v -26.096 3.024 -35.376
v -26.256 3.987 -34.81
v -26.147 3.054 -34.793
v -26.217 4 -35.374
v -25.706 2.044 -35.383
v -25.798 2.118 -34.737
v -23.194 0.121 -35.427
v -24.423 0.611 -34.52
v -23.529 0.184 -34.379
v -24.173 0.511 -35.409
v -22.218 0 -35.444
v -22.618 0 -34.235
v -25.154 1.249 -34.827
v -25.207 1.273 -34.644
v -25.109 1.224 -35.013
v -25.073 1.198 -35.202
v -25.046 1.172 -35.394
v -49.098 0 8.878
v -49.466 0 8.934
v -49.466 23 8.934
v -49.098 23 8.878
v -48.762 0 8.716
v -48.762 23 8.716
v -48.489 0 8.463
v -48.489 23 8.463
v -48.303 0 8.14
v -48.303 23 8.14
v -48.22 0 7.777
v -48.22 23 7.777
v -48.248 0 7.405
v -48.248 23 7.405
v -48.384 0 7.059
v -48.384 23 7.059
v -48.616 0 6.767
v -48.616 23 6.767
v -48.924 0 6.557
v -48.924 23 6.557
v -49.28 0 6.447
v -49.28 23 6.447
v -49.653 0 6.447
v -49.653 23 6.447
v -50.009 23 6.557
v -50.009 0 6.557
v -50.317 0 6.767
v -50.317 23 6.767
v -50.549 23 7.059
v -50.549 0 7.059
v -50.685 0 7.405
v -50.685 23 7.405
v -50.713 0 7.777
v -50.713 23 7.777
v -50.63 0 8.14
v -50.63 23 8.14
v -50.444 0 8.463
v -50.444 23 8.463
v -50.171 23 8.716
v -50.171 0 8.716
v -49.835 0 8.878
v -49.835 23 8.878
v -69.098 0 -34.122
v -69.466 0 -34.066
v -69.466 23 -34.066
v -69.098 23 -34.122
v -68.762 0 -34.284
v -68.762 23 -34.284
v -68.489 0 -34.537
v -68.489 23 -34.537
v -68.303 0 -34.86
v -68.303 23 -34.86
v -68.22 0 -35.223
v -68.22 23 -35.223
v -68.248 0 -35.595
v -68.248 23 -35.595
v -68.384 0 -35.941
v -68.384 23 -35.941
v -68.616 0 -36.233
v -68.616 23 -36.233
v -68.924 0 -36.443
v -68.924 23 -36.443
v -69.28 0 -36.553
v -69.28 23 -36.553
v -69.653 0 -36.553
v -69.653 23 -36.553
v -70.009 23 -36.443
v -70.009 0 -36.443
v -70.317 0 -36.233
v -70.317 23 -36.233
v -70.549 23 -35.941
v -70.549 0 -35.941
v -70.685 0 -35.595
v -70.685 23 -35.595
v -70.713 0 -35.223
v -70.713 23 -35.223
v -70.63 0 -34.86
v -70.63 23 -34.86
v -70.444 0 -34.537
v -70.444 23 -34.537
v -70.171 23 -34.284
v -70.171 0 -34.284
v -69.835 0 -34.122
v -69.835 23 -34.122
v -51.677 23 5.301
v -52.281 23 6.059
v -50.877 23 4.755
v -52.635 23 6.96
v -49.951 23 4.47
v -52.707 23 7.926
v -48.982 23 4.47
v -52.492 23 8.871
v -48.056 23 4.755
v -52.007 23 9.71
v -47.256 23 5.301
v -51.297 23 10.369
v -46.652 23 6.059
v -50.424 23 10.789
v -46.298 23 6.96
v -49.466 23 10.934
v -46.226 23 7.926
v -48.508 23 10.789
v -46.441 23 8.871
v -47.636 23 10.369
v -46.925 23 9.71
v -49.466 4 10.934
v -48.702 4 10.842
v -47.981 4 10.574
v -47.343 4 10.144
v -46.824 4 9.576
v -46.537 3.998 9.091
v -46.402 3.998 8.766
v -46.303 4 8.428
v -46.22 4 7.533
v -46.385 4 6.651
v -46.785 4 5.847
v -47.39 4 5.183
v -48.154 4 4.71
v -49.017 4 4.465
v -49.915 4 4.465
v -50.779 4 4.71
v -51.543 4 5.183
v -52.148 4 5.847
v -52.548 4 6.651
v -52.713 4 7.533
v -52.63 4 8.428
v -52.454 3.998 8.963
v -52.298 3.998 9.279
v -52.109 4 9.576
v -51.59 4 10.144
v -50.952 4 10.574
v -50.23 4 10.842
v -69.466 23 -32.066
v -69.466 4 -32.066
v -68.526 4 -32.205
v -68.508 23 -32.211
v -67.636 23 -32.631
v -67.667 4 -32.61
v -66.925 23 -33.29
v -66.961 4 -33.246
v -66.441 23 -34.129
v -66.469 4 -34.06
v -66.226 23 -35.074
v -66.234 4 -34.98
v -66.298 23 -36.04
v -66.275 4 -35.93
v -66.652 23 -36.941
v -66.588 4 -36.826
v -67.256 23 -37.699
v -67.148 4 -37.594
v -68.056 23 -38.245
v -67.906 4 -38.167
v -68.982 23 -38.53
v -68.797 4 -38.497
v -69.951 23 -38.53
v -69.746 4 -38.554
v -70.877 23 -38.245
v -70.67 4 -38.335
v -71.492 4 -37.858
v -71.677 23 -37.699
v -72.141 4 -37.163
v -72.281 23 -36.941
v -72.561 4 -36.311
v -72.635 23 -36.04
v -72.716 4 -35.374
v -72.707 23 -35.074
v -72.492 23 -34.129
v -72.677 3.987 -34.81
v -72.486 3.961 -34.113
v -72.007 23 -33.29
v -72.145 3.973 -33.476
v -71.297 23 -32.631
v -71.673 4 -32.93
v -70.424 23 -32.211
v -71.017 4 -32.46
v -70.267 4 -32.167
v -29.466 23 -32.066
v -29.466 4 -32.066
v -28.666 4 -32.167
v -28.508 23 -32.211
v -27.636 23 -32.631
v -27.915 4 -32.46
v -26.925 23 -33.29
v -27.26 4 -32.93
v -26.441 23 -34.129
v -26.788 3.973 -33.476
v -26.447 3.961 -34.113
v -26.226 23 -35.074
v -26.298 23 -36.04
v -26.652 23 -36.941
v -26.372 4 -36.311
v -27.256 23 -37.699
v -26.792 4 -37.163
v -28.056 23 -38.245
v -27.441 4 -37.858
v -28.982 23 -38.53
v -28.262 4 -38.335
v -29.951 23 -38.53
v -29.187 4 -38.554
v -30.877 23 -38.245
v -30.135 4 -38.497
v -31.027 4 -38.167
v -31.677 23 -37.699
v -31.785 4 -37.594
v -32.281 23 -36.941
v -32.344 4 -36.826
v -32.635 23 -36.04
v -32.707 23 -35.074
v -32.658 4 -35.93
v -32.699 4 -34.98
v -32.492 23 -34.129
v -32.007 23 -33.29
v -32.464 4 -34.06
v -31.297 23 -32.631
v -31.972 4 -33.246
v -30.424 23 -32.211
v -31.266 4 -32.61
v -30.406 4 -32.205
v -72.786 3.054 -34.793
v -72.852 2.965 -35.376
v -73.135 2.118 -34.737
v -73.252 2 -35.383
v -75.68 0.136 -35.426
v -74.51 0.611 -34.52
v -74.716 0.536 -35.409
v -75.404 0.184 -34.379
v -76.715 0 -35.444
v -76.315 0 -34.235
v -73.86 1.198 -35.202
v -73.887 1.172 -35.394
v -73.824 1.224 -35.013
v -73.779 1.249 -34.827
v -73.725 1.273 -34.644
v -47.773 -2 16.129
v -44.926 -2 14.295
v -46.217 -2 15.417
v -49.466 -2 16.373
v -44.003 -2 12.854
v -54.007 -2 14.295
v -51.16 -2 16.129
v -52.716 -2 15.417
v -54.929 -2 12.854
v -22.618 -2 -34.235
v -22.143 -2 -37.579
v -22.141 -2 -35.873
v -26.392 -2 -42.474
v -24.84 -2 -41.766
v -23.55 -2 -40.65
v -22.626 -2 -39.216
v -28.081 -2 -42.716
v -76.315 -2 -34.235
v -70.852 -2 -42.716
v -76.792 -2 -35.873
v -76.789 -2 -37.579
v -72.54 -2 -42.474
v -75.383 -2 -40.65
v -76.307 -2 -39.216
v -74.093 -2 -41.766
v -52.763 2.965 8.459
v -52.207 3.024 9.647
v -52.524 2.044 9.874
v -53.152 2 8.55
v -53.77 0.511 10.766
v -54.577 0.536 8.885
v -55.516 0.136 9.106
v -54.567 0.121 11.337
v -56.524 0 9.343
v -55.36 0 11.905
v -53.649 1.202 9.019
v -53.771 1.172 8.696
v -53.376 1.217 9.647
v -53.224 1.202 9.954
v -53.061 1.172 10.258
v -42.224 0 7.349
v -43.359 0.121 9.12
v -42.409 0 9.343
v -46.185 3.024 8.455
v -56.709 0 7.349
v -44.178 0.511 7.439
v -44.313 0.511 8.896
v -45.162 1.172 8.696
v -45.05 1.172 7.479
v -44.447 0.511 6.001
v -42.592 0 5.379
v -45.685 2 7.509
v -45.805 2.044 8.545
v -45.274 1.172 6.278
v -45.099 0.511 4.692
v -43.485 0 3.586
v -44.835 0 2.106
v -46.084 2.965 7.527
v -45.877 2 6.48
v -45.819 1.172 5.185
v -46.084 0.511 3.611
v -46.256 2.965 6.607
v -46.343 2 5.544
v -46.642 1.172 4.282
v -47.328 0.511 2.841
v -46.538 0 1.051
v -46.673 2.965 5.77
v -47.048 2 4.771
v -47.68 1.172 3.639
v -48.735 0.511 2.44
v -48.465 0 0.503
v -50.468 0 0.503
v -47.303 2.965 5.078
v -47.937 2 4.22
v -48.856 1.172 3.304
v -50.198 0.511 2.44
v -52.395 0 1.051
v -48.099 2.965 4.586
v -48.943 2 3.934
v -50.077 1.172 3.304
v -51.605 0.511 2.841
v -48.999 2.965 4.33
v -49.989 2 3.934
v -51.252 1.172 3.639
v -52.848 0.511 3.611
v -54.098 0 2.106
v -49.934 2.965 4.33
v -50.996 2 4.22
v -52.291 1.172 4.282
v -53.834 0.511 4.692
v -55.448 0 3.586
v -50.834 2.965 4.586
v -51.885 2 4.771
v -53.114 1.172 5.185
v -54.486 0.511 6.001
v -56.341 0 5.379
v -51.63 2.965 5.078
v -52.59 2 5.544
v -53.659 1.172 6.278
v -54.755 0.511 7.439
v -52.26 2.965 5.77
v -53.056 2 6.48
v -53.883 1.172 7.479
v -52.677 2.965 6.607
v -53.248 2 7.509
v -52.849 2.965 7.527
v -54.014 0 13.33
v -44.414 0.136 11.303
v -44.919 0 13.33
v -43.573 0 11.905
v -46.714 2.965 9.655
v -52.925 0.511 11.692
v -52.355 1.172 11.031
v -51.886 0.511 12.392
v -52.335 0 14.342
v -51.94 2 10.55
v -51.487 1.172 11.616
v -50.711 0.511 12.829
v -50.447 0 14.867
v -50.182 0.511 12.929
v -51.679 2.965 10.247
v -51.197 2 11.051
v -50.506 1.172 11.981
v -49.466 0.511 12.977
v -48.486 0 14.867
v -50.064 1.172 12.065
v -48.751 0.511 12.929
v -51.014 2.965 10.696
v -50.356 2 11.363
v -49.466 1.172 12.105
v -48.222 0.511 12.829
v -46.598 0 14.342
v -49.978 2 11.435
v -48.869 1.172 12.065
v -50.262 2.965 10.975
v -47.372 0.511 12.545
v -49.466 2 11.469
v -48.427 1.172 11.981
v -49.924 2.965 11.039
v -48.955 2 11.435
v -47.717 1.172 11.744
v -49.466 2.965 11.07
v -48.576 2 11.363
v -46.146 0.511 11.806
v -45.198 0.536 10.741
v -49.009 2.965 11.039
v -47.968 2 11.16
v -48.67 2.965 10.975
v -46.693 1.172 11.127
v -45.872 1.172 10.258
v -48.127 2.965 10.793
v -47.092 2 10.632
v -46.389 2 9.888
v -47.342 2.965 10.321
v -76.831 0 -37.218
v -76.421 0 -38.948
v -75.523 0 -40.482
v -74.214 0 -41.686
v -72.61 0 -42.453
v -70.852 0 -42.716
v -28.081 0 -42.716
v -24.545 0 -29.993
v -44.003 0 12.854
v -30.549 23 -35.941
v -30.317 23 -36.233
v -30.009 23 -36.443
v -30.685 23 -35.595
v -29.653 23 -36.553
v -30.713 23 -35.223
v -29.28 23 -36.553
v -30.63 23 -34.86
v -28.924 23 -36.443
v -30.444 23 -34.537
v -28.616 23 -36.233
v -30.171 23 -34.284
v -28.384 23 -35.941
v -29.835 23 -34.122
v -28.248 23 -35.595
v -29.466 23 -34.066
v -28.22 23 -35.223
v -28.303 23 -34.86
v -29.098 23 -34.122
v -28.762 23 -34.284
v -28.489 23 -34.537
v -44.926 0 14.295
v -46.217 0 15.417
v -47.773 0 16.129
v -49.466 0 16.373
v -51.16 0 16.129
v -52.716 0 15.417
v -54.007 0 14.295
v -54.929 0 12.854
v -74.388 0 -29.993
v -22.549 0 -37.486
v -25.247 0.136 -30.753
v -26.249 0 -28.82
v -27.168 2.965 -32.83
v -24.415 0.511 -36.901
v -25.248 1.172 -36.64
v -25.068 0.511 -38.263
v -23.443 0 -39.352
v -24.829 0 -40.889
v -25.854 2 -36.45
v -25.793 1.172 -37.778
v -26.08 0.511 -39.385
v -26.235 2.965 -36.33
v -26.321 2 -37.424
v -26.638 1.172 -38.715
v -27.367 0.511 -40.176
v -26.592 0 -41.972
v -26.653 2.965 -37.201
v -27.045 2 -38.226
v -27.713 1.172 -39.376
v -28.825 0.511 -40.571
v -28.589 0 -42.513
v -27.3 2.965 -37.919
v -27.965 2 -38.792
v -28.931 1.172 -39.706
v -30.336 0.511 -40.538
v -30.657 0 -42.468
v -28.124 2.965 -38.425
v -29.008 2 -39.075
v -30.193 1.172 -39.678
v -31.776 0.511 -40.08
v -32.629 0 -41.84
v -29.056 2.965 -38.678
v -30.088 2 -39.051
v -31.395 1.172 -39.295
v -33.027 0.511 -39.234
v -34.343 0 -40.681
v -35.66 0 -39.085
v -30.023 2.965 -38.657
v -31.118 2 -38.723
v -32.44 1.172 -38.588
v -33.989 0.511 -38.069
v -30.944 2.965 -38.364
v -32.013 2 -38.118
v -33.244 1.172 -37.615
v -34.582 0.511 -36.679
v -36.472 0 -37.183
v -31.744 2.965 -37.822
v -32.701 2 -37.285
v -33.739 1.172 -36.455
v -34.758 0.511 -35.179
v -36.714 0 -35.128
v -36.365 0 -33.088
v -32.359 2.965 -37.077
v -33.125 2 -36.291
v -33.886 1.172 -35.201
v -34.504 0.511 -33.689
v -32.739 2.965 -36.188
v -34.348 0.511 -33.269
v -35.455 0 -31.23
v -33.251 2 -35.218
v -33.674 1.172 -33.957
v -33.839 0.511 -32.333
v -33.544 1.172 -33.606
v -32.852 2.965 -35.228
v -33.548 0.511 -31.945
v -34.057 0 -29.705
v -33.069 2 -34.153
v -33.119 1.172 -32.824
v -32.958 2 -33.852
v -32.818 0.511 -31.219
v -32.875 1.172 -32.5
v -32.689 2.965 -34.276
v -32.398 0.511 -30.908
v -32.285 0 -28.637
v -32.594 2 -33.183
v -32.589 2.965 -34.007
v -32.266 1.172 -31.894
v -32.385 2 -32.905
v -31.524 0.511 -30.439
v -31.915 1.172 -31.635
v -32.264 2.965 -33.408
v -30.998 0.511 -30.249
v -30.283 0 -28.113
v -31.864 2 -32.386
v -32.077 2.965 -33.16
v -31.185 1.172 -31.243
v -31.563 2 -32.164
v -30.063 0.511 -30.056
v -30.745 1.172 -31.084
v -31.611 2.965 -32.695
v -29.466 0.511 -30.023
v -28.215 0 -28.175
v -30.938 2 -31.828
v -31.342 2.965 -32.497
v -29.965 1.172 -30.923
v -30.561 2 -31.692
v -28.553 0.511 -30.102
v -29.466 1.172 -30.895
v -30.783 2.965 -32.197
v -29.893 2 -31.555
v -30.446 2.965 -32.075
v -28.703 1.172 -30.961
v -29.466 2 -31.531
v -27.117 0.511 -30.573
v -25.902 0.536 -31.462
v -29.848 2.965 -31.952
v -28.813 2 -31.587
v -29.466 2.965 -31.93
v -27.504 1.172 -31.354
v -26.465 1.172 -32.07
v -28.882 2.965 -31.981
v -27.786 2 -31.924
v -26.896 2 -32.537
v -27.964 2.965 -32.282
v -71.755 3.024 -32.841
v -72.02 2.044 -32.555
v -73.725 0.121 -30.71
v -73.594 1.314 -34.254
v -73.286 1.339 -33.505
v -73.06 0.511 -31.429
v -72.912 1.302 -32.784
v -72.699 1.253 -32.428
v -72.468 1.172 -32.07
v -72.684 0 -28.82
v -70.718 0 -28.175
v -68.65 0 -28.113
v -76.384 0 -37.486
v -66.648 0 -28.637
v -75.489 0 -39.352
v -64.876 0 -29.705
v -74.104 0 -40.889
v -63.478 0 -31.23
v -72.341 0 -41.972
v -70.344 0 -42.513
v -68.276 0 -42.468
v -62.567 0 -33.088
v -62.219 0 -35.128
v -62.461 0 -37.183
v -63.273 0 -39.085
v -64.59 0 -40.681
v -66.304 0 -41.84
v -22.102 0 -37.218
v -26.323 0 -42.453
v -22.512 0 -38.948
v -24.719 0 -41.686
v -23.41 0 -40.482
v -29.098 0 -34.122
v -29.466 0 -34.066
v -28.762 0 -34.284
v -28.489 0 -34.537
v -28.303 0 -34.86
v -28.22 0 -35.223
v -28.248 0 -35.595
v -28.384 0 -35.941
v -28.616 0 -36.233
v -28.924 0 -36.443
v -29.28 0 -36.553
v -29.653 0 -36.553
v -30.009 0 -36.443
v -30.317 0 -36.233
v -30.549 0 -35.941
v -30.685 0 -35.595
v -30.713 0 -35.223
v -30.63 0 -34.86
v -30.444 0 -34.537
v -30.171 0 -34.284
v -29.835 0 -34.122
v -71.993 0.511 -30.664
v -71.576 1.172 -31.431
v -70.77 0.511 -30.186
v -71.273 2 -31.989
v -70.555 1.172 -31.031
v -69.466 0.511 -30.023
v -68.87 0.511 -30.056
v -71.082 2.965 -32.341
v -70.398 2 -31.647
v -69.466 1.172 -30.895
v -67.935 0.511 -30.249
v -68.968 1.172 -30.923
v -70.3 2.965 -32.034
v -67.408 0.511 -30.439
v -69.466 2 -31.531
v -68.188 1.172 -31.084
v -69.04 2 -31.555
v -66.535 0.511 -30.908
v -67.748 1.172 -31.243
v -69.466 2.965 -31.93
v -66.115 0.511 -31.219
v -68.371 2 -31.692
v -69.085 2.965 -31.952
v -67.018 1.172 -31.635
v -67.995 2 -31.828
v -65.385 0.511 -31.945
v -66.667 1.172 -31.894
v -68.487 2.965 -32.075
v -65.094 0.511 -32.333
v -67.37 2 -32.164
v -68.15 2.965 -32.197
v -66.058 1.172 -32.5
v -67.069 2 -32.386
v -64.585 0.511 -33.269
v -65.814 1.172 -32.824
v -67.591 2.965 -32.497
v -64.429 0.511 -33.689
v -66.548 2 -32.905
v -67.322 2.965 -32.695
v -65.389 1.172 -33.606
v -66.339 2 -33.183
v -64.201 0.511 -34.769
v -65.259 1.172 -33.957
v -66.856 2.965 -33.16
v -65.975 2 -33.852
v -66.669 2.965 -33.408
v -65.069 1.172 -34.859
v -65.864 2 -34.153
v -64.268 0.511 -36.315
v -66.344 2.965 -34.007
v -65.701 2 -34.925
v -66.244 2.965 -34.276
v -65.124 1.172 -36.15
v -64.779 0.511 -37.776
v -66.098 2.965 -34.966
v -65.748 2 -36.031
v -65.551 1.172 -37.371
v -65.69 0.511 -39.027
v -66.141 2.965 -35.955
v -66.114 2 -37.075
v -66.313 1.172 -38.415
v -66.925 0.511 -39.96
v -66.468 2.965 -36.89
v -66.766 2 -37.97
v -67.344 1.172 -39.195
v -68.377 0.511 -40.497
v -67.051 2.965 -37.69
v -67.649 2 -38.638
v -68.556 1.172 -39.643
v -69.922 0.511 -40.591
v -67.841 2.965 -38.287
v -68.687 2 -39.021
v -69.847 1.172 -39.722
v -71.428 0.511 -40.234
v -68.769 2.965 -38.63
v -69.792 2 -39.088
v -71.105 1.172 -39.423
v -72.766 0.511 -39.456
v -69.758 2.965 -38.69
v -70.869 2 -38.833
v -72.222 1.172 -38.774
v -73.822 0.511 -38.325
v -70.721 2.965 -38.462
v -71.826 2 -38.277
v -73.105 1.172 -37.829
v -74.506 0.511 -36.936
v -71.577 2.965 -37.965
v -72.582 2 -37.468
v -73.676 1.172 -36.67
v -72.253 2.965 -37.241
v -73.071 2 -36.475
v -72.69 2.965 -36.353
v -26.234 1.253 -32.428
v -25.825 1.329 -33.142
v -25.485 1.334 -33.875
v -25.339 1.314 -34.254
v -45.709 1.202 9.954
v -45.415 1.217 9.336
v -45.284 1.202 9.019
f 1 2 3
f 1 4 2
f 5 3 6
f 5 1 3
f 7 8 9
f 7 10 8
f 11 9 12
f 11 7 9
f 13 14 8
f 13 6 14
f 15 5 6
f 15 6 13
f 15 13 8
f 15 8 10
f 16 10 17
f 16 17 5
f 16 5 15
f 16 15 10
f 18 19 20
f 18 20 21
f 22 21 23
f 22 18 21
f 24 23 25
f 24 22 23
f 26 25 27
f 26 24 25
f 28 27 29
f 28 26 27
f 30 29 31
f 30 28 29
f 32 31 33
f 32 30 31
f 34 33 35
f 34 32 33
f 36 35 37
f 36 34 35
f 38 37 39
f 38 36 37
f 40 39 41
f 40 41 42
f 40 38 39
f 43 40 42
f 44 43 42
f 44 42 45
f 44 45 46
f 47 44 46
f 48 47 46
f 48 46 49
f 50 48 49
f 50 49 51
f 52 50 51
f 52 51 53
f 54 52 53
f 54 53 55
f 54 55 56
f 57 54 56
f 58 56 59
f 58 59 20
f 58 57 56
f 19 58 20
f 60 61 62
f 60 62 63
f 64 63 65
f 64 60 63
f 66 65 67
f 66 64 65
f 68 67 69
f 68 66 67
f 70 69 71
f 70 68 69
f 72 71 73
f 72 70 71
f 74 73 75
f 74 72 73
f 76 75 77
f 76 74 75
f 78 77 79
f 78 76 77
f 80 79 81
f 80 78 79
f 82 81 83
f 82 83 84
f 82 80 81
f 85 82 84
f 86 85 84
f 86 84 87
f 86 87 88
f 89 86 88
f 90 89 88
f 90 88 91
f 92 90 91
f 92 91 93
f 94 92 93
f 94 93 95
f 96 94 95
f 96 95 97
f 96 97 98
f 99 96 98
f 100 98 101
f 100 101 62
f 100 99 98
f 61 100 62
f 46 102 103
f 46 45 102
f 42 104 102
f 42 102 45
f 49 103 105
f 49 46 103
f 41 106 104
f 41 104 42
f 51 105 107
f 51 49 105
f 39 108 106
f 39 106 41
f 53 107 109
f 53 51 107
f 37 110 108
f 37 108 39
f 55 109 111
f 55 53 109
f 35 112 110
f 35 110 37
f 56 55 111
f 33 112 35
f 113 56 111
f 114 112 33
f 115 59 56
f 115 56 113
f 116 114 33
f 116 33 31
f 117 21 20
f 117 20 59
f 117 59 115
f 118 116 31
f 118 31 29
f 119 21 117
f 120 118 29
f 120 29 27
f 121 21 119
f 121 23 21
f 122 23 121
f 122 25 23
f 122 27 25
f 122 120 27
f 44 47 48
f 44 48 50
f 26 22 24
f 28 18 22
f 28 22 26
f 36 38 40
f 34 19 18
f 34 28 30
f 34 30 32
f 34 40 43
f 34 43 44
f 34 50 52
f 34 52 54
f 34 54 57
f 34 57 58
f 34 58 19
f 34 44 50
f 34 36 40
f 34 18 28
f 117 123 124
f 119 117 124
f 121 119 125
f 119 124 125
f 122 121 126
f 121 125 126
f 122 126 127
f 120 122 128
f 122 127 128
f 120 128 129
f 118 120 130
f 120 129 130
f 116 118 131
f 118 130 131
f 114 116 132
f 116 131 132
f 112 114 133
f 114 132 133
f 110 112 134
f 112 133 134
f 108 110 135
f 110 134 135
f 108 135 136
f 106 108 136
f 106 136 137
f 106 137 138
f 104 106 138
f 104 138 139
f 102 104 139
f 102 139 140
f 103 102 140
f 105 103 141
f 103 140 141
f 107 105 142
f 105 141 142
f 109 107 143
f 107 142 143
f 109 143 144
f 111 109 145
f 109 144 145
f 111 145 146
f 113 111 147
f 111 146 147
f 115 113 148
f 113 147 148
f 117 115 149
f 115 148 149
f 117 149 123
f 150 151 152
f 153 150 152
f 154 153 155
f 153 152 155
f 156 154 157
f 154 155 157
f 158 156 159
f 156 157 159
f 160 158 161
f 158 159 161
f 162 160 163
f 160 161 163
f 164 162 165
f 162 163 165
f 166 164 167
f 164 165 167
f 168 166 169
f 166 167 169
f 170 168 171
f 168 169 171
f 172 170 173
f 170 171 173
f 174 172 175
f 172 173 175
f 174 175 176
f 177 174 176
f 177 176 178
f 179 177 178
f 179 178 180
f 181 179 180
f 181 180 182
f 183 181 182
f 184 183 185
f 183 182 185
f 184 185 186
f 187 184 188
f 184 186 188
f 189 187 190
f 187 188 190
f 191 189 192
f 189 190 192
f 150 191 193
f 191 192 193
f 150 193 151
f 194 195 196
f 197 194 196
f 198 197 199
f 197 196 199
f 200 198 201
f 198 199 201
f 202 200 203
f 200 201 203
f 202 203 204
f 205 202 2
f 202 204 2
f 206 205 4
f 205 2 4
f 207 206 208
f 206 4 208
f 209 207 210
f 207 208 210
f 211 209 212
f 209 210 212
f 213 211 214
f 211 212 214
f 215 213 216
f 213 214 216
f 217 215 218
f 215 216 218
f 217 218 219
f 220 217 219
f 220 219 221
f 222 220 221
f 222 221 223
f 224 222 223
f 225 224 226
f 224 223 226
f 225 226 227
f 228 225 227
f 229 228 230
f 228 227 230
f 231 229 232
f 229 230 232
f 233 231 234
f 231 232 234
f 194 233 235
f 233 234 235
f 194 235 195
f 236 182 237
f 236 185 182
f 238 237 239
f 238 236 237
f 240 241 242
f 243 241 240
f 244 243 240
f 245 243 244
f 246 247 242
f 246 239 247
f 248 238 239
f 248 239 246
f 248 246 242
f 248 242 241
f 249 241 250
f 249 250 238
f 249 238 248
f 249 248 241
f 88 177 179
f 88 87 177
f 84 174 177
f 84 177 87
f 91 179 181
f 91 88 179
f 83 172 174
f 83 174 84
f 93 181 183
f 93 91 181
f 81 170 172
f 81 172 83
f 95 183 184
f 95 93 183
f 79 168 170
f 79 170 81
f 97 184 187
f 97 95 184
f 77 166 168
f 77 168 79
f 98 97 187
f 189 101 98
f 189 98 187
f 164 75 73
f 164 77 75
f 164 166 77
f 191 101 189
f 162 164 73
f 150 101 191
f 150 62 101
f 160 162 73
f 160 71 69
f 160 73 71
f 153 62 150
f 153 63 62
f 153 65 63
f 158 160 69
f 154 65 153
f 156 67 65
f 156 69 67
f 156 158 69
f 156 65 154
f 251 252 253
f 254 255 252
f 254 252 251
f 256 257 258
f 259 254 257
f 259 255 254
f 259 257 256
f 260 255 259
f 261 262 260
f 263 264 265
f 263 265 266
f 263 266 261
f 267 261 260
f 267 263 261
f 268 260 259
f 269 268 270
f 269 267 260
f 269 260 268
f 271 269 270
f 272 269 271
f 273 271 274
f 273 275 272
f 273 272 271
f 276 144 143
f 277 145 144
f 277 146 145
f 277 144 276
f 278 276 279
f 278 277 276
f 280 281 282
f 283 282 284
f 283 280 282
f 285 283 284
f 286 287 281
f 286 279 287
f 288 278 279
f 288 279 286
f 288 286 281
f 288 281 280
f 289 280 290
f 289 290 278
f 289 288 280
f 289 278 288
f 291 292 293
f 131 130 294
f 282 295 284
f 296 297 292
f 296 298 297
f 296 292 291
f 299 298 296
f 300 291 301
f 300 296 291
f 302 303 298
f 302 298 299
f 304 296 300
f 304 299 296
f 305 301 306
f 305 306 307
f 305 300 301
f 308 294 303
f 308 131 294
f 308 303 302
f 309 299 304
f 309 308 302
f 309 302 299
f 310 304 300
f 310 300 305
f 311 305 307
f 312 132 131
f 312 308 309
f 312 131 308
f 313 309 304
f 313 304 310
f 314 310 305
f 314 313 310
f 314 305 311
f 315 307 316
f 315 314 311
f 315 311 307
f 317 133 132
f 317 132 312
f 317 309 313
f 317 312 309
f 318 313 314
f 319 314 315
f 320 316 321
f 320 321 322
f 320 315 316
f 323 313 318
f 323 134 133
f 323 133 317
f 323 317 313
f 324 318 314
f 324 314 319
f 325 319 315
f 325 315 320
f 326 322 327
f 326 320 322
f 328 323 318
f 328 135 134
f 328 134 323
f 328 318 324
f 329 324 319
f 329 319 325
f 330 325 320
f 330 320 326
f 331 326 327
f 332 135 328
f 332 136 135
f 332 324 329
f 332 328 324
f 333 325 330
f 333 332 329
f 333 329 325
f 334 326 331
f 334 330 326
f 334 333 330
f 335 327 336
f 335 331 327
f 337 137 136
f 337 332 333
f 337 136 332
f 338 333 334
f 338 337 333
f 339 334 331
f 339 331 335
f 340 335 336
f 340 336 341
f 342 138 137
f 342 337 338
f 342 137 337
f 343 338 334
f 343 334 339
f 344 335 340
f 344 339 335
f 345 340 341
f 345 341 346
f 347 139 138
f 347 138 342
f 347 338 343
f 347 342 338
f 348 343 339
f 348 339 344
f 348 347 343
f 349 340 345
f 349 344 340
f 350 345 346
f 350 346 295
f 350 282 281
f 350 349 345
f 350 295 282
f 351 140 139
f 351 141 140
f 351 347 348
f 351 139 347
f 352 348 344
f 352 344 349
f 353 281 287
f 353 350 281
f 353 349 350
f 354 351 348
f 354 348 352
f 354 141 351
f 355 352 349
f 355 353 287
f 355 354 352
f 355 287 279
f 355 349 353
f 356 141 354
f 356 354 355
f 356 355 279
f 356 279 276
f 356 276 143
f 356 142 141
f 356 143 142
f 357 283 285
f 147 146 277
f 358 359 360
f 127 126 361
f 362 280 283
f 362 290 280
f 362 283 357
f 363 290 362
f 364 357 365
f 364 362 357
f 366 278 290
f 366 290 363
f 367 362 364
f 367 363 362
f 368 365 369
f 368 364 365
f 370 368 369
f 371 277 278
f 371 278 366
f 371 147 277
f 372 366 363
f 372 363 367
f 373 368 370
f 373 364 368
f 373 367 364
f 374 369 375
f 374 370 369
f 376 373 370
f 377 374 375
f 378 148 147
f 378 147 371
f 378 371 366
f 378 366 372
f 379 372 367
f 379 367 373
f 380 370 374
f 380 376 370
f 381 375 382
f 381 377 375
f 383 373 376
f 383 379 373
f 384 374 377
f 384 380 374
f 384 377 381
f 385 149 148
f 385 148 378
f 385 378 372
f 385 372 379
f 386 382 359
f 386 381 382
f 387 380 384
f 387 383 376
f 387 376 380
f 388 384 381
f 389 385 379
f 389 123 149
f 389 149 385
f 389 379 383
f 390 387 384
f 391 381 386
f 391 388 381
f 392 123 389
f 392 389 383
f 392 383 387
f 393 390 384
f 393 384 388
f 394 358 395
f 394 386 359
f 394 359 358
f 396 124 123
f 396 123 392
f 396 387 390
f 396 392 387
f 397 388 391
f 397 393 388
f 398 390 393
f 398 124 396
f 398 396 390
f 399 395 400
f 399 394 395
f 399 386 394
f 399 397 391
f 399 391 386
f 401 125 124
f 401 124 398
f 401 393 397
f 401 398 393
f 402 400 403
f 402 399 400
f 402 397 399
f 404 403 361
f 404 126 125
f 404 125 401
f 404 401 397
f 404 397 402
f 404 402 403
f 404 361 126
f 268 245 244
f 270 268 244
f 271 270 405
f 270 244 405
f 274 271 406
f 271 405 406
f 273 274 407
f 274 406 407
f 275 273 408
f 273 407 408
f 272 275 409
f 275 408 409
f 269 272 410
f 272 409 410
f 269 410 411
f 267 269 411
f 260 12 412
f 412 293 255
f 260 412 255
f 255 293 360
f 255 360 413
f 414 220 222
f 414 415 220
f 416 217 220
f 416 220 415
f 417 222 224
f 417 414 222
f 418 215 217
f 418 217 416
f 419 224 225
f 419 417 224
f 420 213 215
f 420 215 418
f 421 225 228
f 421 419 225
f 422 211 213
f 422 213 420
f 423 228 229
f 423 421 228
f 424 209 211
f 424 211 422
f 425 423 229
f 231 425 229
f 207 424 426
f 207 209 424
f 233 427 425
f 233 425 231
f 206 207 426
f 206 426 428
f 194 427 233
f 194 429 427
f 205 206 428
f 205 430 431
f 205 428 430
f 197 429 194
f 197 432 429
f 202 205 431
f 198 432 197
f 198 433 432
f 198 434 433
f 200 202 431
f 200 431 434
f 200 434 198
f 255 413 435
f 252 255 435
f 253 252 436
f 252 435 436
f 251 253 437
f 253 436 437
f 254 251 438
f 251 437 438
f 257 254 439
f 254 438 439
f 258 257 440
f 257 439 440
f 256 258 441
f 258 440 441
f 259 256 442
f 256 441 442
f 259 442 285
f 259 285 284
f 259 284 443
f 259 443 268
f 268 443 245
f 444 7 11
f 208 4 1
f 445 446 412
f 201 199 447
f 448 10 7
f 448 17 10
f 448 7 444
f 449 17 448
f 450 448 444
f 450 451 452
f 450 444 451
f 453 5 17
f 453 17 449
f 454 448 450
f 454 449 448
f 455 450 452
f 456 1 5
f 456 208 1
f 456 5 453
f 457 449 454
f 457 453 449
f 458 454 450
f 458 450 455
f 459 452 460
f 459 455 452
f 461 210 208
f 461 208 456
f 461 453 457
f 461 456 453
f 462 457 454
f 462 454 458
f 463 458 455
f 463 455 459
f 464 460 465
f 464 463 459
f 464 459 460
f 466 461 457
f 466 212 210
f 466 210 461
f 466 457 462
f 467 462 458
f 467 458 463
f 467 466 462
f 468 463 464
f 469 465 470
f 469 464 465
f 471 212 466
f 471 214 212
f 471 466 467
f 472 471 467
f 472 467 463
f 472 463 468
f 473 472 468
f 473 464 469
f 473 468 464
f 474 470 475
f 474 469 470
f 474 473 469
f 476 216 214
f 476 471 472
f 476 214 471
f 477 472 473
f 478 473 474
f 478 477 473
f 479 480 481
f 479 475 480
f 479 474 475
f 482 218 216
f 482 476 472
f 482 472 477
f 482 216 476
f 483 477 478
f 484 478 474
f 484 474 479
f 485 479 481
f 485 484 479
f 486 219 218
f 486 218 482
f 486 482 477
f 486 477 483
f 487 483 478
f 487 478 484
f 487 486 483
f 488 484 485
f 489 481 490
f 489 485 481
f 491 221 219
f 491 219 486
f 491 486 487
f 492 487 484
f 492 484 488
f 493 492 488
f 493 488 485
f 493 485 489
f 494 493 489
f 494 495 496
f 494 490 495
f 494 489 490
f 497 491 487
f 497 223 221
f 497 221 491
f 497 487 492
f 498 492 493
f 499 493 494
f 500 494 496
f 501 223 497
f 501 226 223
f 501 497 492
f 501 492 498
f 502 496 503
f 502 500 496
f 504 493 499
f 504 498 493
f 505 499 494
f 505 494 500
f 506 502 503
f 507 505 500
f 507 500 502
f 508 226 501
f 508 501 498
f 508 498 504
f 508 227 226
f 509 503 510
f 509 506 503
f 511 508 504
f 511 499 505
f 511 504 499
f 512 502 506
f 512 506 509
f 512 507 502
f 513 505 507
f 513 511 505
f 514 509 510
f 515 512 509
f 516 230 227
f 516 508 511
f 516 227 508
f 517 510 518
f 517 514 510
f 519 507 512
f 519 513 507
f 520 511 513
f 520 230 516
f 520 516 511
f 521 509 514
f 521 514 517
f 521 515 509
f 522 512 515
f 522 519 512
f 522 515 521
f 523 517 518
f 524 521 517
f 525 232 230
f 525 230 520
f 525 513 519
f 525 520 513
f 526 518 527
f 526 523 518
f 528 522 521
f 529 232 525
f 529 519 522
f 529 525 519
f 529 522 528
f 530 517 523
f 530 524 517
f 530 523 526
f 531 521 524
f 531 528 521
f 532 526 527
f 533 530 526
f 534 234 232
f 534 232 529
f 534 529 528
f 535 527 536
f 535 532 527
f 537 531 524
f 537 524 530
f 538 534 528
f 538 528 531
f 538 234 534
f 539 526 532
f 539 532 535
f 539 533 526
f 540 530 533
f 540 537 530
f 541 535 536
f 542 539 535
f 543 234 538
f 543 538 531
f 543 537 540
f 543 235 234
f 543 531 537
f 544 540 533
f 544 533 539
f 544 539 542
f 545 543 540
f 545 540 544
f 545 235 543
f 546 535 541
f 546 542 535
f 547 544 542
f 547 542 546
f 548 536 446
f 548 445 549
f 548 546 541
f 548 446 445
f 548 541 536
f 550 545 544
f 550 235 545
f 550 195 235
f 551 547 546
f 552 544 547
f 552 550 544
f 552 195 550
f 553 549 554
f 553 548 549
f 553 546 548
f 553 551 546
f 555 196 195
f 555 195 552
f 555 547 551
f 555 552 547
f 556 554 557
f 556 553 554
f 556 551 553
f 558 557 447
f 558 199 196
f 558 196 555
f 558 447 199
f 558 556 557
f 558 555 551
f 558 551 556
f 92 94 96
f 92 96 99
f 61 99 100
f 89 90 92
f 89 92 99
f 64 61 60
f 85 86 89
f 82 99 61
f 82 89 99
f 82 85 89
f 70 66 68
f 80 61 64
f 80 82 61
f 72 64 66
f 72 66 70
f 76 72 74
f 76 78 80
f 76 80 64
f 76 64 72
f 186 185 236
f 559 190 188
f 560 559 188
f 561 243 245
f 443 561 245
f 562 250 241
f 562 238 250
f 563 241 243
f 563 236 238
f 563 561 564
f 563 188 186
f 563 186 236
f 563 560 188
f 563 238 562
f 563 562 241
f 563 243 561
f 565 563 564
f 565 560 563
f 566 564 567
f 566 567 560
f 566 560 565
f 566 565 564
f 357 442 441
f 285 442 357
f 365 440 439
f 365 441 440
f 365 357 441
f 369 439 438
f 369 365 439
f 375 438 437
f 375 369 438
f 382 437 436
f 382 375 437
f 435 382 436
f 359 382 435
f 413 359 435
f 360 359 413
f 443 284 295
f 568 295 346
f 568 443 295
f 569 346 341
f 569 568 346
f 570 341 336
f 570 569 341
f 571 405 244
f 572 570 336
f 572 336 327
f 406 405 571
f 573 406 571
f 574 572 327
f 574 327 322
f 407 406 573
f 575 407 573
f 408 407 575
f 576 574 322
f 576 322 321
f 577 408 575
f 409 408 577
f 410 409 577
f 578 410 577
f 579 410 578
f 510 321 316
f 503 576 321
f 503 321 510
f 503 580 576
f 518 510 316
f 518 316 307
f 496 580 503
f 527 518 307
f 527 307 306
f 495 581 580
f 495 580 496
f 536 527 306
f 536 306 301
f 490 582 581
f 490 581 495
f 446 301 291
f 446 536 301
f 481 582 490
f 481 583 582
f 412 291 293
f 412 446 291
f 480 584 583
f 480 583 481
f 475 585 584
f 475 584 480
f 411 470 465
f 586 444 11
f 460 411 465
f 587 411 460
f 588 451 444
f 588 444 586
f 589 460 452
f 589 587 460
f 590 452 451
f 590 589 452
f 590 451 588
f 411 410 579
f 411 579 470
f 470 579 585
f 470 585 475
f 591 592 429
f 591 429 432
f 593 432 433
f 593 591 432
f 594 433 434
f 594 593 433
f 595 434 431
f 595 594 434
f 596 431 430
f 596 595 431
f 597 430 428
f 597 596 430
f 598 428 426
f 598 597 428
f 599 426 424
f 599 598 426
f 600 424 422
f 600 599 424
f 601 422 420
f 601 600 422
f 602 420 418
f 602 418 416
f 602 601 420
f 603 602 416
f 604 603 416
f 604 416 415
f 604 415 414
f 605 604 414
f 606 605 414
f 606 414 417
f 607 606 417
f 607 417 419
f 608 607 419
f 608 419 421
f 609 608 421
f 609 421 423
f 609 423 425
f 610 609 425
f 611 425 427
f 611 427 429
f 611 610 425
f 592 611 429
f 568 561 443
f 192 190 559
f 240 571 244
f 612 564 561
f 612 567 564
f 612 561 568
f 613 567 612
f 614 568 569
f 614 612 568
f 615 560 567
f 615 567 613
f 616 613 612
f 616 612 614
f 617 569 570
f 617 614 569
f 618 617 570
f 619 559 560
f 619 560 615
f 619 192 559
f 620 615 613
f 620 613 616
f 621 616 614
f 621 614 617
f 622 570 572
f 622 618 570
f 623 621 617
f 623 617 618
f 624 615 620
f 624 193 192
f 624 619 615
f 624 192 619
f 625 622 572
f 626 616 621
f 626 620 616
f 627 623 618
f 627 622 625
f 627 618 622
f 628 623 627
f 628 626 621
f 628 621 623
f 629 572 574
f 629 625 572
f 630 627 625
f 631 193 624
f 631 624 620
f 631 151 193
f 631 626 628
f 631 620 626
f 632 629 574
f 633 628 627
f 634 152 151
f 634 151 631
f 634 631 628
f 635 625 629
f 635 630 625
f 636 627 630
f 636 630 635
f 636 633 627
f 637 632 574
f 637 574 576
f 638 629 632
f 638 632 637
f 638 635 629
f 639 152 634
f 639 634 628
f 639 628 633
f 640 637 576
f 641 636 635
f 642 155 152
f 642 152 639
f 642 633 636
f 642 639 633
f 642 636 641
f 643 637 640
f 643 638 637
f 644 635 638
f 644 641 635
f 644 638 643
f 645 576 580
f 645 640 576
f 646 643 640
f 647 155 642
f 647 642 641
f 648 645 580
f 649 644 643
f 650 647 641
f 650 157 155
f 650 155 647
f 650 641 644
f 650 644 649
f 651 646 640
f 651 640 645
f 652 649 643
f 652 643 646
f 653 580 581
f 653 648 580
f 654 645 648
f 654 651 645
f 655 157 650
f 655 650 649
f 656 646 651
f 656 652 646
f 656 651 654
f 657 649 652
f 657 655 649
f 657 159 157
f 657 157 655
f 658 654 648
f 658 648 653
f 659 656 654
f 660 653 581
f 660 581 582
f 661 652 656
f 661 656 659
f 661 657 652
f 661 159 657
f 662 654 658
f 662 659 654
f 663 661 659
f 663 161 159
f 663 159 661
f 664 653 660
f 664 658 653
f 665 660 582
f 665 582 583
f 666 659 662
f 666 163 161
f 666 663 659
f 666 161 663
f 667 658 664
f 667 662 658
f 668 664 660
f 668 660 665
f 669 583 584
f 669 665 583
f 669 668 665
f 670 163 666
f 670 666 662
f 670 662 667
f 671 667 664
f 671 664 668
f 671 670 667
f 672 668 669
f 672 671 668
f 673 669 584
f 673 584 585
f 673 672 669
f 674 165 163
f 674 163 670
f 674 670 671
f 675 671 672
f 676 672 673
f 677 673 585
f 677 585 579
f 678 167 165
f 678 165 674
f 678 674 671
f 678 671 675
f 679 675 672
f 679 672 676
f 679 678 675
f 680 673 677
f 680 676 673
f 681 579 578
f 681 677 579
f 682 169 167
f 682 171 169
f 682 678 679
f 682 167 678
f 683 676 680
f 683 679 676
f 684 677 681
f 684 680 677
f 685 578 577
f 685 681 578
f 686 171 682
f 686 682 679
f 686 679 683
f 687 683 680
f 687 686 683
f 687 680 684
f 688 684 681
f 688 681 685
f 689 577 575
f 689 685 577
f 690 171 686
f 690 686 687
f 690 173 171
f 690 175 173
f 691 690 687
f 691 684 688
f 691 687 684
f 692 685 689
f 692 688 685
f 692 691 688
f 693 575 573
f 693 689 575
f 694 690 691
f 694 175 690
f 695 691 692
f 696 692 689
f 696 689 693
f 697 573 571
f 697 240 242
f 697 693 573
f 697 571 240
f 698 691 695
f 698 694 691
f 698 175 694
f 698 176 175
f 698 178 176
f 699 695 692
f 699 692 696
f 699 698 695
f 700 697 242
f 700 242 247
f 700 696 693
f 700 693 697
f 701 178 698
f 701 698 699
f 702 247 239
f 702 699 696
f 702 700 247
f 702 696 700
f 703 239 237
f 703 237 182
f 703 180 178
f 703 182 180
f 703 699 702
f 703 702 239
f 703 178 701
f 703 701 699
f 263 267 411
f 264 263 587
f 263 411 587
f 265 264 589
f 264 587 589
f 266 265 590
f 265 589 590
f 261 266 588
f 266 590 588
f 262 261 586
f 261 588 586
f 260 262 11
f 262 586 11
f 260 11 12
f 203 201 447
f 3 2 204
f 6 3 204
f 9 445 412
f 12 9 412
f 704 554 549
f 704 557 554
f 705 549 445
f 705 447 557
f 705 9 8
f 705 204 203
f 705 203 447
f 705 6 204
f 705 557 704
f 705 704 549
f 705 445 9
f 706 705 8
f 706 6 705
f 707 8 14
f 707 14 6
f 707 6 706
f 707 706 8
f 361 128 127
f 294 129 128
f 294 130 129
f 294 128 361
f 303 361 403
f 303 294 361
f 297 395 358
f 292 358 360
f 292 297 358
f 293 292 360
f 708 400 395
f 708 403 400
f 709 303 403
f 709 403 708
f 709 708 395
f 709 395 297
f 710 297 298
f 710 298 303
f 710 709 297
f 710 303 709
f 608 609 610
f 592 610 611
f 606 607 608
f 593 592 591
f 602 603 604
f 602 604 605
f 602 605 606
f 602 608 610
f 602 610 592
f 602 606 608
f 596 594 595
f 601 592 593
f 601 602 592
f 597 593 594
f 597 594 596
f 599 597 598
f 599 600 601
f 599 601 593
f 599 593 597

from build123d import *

# Parameters (mm, degrees)
BOSS_EXTRUDE1_DEPTH = 2
SKETCH1_3_R         = 3.25
SKETCH1_3_R_2       = 1.25
BOSS_EXTRUDE2_DEPTH = 23
FILLET1_R           = 4


with BuildPart() as part:
    # Sketch1 → Boss-Extrude1 (new body)
    with BuildSketch(Plane(origin=(0, 0, 0), x_dir=(1, 0, 0), z_dir=(0, 1, 0))):
        with BuildLine():
            Line((-28.08102558, 42.716483516), (-70.851819352, 42.716483516))
            ThreePointArc((-70.851819352, 42.716483516), (-75.89592212, 39.96564145), (-76.314848193, 34.235492608))
            Line((-76.314848193, 34.235492608), (-54.929451307, -12.854176105))
            ThreePointArc((-54.929451307, -12.854176105), (-49.466422466, -16.373185197), (-44.003393626, -12.854176105))
            Line((-44.003393626, -12.854176105), (-22.61799674, 34.235492608))
            ThreePointArc((-22.61799674, 34.235492608), (-23.036922813, 39.96564145), (-28.08102558, 42.716483516))
        make_face()
    extrude(amount=-BOSS_EXTRUDE1_DEPTH)

    # Sketch1<3> → Boss-Extrude2 (add)
    # profile 1 of 3: a face of its own
    with BuildSketch(Plane(origin=(0, 0, 0), x_dir=(1, 0, 0), z_dir=(0, 1, 0))):
        with Locations((-49.466422466, -7.683516484)):
            Circle(SKETCH1_3_R)
        with Locations((-49.466422466, -7.683516484)):
            Circle(SKETCH1_3_R_2, mode=Mode.SUBTRACT)
    # profile 2 of 3: a face of its own
    with BuildSketch(Plane(origin=(0, 0, 0), x_dir=(1, 0, 0), z_dir=(0, 1, 0))):
        with Locations((-29.466422466, 35.316483516)):
            Circle(SKETCH1_3_R)
        with Locations((-29.466422466, 35.316483516)):
            Circle(SKETCH1_3_R_2, mode=Mode.SUBTRACT)
    # profile 3 of 3: a face of its own
    with BuildSketch(Plane(origin=(0, 0, 0), x_dir=(1, 0, 0), z_dir=(0, 1, 0))):
        with Locations((-69.466422466, 35.316483516)):
            Circle(SKETCH1_3_R)
        with Locations((-69.466422466, 35.316483516)):
            Circle(SKETCH1_3_R_2, mode=Mode.SUBTRACT)
    extrude(amount=BOSS_EXTRUDE2_DEPTH)

    # Fillet1
    fillet1_edges = [part.edges().sort_by_distance(p)[0] for p in [
        (-52.716422466, 0, 7.683516484),
        (-72.716422466, 0, -35.316483516),
        (-32.716422466, 0, -35.316483516),
    ]]
    fillet(fillet1_edges, radius=FILLET1_R)


solid = part.part
